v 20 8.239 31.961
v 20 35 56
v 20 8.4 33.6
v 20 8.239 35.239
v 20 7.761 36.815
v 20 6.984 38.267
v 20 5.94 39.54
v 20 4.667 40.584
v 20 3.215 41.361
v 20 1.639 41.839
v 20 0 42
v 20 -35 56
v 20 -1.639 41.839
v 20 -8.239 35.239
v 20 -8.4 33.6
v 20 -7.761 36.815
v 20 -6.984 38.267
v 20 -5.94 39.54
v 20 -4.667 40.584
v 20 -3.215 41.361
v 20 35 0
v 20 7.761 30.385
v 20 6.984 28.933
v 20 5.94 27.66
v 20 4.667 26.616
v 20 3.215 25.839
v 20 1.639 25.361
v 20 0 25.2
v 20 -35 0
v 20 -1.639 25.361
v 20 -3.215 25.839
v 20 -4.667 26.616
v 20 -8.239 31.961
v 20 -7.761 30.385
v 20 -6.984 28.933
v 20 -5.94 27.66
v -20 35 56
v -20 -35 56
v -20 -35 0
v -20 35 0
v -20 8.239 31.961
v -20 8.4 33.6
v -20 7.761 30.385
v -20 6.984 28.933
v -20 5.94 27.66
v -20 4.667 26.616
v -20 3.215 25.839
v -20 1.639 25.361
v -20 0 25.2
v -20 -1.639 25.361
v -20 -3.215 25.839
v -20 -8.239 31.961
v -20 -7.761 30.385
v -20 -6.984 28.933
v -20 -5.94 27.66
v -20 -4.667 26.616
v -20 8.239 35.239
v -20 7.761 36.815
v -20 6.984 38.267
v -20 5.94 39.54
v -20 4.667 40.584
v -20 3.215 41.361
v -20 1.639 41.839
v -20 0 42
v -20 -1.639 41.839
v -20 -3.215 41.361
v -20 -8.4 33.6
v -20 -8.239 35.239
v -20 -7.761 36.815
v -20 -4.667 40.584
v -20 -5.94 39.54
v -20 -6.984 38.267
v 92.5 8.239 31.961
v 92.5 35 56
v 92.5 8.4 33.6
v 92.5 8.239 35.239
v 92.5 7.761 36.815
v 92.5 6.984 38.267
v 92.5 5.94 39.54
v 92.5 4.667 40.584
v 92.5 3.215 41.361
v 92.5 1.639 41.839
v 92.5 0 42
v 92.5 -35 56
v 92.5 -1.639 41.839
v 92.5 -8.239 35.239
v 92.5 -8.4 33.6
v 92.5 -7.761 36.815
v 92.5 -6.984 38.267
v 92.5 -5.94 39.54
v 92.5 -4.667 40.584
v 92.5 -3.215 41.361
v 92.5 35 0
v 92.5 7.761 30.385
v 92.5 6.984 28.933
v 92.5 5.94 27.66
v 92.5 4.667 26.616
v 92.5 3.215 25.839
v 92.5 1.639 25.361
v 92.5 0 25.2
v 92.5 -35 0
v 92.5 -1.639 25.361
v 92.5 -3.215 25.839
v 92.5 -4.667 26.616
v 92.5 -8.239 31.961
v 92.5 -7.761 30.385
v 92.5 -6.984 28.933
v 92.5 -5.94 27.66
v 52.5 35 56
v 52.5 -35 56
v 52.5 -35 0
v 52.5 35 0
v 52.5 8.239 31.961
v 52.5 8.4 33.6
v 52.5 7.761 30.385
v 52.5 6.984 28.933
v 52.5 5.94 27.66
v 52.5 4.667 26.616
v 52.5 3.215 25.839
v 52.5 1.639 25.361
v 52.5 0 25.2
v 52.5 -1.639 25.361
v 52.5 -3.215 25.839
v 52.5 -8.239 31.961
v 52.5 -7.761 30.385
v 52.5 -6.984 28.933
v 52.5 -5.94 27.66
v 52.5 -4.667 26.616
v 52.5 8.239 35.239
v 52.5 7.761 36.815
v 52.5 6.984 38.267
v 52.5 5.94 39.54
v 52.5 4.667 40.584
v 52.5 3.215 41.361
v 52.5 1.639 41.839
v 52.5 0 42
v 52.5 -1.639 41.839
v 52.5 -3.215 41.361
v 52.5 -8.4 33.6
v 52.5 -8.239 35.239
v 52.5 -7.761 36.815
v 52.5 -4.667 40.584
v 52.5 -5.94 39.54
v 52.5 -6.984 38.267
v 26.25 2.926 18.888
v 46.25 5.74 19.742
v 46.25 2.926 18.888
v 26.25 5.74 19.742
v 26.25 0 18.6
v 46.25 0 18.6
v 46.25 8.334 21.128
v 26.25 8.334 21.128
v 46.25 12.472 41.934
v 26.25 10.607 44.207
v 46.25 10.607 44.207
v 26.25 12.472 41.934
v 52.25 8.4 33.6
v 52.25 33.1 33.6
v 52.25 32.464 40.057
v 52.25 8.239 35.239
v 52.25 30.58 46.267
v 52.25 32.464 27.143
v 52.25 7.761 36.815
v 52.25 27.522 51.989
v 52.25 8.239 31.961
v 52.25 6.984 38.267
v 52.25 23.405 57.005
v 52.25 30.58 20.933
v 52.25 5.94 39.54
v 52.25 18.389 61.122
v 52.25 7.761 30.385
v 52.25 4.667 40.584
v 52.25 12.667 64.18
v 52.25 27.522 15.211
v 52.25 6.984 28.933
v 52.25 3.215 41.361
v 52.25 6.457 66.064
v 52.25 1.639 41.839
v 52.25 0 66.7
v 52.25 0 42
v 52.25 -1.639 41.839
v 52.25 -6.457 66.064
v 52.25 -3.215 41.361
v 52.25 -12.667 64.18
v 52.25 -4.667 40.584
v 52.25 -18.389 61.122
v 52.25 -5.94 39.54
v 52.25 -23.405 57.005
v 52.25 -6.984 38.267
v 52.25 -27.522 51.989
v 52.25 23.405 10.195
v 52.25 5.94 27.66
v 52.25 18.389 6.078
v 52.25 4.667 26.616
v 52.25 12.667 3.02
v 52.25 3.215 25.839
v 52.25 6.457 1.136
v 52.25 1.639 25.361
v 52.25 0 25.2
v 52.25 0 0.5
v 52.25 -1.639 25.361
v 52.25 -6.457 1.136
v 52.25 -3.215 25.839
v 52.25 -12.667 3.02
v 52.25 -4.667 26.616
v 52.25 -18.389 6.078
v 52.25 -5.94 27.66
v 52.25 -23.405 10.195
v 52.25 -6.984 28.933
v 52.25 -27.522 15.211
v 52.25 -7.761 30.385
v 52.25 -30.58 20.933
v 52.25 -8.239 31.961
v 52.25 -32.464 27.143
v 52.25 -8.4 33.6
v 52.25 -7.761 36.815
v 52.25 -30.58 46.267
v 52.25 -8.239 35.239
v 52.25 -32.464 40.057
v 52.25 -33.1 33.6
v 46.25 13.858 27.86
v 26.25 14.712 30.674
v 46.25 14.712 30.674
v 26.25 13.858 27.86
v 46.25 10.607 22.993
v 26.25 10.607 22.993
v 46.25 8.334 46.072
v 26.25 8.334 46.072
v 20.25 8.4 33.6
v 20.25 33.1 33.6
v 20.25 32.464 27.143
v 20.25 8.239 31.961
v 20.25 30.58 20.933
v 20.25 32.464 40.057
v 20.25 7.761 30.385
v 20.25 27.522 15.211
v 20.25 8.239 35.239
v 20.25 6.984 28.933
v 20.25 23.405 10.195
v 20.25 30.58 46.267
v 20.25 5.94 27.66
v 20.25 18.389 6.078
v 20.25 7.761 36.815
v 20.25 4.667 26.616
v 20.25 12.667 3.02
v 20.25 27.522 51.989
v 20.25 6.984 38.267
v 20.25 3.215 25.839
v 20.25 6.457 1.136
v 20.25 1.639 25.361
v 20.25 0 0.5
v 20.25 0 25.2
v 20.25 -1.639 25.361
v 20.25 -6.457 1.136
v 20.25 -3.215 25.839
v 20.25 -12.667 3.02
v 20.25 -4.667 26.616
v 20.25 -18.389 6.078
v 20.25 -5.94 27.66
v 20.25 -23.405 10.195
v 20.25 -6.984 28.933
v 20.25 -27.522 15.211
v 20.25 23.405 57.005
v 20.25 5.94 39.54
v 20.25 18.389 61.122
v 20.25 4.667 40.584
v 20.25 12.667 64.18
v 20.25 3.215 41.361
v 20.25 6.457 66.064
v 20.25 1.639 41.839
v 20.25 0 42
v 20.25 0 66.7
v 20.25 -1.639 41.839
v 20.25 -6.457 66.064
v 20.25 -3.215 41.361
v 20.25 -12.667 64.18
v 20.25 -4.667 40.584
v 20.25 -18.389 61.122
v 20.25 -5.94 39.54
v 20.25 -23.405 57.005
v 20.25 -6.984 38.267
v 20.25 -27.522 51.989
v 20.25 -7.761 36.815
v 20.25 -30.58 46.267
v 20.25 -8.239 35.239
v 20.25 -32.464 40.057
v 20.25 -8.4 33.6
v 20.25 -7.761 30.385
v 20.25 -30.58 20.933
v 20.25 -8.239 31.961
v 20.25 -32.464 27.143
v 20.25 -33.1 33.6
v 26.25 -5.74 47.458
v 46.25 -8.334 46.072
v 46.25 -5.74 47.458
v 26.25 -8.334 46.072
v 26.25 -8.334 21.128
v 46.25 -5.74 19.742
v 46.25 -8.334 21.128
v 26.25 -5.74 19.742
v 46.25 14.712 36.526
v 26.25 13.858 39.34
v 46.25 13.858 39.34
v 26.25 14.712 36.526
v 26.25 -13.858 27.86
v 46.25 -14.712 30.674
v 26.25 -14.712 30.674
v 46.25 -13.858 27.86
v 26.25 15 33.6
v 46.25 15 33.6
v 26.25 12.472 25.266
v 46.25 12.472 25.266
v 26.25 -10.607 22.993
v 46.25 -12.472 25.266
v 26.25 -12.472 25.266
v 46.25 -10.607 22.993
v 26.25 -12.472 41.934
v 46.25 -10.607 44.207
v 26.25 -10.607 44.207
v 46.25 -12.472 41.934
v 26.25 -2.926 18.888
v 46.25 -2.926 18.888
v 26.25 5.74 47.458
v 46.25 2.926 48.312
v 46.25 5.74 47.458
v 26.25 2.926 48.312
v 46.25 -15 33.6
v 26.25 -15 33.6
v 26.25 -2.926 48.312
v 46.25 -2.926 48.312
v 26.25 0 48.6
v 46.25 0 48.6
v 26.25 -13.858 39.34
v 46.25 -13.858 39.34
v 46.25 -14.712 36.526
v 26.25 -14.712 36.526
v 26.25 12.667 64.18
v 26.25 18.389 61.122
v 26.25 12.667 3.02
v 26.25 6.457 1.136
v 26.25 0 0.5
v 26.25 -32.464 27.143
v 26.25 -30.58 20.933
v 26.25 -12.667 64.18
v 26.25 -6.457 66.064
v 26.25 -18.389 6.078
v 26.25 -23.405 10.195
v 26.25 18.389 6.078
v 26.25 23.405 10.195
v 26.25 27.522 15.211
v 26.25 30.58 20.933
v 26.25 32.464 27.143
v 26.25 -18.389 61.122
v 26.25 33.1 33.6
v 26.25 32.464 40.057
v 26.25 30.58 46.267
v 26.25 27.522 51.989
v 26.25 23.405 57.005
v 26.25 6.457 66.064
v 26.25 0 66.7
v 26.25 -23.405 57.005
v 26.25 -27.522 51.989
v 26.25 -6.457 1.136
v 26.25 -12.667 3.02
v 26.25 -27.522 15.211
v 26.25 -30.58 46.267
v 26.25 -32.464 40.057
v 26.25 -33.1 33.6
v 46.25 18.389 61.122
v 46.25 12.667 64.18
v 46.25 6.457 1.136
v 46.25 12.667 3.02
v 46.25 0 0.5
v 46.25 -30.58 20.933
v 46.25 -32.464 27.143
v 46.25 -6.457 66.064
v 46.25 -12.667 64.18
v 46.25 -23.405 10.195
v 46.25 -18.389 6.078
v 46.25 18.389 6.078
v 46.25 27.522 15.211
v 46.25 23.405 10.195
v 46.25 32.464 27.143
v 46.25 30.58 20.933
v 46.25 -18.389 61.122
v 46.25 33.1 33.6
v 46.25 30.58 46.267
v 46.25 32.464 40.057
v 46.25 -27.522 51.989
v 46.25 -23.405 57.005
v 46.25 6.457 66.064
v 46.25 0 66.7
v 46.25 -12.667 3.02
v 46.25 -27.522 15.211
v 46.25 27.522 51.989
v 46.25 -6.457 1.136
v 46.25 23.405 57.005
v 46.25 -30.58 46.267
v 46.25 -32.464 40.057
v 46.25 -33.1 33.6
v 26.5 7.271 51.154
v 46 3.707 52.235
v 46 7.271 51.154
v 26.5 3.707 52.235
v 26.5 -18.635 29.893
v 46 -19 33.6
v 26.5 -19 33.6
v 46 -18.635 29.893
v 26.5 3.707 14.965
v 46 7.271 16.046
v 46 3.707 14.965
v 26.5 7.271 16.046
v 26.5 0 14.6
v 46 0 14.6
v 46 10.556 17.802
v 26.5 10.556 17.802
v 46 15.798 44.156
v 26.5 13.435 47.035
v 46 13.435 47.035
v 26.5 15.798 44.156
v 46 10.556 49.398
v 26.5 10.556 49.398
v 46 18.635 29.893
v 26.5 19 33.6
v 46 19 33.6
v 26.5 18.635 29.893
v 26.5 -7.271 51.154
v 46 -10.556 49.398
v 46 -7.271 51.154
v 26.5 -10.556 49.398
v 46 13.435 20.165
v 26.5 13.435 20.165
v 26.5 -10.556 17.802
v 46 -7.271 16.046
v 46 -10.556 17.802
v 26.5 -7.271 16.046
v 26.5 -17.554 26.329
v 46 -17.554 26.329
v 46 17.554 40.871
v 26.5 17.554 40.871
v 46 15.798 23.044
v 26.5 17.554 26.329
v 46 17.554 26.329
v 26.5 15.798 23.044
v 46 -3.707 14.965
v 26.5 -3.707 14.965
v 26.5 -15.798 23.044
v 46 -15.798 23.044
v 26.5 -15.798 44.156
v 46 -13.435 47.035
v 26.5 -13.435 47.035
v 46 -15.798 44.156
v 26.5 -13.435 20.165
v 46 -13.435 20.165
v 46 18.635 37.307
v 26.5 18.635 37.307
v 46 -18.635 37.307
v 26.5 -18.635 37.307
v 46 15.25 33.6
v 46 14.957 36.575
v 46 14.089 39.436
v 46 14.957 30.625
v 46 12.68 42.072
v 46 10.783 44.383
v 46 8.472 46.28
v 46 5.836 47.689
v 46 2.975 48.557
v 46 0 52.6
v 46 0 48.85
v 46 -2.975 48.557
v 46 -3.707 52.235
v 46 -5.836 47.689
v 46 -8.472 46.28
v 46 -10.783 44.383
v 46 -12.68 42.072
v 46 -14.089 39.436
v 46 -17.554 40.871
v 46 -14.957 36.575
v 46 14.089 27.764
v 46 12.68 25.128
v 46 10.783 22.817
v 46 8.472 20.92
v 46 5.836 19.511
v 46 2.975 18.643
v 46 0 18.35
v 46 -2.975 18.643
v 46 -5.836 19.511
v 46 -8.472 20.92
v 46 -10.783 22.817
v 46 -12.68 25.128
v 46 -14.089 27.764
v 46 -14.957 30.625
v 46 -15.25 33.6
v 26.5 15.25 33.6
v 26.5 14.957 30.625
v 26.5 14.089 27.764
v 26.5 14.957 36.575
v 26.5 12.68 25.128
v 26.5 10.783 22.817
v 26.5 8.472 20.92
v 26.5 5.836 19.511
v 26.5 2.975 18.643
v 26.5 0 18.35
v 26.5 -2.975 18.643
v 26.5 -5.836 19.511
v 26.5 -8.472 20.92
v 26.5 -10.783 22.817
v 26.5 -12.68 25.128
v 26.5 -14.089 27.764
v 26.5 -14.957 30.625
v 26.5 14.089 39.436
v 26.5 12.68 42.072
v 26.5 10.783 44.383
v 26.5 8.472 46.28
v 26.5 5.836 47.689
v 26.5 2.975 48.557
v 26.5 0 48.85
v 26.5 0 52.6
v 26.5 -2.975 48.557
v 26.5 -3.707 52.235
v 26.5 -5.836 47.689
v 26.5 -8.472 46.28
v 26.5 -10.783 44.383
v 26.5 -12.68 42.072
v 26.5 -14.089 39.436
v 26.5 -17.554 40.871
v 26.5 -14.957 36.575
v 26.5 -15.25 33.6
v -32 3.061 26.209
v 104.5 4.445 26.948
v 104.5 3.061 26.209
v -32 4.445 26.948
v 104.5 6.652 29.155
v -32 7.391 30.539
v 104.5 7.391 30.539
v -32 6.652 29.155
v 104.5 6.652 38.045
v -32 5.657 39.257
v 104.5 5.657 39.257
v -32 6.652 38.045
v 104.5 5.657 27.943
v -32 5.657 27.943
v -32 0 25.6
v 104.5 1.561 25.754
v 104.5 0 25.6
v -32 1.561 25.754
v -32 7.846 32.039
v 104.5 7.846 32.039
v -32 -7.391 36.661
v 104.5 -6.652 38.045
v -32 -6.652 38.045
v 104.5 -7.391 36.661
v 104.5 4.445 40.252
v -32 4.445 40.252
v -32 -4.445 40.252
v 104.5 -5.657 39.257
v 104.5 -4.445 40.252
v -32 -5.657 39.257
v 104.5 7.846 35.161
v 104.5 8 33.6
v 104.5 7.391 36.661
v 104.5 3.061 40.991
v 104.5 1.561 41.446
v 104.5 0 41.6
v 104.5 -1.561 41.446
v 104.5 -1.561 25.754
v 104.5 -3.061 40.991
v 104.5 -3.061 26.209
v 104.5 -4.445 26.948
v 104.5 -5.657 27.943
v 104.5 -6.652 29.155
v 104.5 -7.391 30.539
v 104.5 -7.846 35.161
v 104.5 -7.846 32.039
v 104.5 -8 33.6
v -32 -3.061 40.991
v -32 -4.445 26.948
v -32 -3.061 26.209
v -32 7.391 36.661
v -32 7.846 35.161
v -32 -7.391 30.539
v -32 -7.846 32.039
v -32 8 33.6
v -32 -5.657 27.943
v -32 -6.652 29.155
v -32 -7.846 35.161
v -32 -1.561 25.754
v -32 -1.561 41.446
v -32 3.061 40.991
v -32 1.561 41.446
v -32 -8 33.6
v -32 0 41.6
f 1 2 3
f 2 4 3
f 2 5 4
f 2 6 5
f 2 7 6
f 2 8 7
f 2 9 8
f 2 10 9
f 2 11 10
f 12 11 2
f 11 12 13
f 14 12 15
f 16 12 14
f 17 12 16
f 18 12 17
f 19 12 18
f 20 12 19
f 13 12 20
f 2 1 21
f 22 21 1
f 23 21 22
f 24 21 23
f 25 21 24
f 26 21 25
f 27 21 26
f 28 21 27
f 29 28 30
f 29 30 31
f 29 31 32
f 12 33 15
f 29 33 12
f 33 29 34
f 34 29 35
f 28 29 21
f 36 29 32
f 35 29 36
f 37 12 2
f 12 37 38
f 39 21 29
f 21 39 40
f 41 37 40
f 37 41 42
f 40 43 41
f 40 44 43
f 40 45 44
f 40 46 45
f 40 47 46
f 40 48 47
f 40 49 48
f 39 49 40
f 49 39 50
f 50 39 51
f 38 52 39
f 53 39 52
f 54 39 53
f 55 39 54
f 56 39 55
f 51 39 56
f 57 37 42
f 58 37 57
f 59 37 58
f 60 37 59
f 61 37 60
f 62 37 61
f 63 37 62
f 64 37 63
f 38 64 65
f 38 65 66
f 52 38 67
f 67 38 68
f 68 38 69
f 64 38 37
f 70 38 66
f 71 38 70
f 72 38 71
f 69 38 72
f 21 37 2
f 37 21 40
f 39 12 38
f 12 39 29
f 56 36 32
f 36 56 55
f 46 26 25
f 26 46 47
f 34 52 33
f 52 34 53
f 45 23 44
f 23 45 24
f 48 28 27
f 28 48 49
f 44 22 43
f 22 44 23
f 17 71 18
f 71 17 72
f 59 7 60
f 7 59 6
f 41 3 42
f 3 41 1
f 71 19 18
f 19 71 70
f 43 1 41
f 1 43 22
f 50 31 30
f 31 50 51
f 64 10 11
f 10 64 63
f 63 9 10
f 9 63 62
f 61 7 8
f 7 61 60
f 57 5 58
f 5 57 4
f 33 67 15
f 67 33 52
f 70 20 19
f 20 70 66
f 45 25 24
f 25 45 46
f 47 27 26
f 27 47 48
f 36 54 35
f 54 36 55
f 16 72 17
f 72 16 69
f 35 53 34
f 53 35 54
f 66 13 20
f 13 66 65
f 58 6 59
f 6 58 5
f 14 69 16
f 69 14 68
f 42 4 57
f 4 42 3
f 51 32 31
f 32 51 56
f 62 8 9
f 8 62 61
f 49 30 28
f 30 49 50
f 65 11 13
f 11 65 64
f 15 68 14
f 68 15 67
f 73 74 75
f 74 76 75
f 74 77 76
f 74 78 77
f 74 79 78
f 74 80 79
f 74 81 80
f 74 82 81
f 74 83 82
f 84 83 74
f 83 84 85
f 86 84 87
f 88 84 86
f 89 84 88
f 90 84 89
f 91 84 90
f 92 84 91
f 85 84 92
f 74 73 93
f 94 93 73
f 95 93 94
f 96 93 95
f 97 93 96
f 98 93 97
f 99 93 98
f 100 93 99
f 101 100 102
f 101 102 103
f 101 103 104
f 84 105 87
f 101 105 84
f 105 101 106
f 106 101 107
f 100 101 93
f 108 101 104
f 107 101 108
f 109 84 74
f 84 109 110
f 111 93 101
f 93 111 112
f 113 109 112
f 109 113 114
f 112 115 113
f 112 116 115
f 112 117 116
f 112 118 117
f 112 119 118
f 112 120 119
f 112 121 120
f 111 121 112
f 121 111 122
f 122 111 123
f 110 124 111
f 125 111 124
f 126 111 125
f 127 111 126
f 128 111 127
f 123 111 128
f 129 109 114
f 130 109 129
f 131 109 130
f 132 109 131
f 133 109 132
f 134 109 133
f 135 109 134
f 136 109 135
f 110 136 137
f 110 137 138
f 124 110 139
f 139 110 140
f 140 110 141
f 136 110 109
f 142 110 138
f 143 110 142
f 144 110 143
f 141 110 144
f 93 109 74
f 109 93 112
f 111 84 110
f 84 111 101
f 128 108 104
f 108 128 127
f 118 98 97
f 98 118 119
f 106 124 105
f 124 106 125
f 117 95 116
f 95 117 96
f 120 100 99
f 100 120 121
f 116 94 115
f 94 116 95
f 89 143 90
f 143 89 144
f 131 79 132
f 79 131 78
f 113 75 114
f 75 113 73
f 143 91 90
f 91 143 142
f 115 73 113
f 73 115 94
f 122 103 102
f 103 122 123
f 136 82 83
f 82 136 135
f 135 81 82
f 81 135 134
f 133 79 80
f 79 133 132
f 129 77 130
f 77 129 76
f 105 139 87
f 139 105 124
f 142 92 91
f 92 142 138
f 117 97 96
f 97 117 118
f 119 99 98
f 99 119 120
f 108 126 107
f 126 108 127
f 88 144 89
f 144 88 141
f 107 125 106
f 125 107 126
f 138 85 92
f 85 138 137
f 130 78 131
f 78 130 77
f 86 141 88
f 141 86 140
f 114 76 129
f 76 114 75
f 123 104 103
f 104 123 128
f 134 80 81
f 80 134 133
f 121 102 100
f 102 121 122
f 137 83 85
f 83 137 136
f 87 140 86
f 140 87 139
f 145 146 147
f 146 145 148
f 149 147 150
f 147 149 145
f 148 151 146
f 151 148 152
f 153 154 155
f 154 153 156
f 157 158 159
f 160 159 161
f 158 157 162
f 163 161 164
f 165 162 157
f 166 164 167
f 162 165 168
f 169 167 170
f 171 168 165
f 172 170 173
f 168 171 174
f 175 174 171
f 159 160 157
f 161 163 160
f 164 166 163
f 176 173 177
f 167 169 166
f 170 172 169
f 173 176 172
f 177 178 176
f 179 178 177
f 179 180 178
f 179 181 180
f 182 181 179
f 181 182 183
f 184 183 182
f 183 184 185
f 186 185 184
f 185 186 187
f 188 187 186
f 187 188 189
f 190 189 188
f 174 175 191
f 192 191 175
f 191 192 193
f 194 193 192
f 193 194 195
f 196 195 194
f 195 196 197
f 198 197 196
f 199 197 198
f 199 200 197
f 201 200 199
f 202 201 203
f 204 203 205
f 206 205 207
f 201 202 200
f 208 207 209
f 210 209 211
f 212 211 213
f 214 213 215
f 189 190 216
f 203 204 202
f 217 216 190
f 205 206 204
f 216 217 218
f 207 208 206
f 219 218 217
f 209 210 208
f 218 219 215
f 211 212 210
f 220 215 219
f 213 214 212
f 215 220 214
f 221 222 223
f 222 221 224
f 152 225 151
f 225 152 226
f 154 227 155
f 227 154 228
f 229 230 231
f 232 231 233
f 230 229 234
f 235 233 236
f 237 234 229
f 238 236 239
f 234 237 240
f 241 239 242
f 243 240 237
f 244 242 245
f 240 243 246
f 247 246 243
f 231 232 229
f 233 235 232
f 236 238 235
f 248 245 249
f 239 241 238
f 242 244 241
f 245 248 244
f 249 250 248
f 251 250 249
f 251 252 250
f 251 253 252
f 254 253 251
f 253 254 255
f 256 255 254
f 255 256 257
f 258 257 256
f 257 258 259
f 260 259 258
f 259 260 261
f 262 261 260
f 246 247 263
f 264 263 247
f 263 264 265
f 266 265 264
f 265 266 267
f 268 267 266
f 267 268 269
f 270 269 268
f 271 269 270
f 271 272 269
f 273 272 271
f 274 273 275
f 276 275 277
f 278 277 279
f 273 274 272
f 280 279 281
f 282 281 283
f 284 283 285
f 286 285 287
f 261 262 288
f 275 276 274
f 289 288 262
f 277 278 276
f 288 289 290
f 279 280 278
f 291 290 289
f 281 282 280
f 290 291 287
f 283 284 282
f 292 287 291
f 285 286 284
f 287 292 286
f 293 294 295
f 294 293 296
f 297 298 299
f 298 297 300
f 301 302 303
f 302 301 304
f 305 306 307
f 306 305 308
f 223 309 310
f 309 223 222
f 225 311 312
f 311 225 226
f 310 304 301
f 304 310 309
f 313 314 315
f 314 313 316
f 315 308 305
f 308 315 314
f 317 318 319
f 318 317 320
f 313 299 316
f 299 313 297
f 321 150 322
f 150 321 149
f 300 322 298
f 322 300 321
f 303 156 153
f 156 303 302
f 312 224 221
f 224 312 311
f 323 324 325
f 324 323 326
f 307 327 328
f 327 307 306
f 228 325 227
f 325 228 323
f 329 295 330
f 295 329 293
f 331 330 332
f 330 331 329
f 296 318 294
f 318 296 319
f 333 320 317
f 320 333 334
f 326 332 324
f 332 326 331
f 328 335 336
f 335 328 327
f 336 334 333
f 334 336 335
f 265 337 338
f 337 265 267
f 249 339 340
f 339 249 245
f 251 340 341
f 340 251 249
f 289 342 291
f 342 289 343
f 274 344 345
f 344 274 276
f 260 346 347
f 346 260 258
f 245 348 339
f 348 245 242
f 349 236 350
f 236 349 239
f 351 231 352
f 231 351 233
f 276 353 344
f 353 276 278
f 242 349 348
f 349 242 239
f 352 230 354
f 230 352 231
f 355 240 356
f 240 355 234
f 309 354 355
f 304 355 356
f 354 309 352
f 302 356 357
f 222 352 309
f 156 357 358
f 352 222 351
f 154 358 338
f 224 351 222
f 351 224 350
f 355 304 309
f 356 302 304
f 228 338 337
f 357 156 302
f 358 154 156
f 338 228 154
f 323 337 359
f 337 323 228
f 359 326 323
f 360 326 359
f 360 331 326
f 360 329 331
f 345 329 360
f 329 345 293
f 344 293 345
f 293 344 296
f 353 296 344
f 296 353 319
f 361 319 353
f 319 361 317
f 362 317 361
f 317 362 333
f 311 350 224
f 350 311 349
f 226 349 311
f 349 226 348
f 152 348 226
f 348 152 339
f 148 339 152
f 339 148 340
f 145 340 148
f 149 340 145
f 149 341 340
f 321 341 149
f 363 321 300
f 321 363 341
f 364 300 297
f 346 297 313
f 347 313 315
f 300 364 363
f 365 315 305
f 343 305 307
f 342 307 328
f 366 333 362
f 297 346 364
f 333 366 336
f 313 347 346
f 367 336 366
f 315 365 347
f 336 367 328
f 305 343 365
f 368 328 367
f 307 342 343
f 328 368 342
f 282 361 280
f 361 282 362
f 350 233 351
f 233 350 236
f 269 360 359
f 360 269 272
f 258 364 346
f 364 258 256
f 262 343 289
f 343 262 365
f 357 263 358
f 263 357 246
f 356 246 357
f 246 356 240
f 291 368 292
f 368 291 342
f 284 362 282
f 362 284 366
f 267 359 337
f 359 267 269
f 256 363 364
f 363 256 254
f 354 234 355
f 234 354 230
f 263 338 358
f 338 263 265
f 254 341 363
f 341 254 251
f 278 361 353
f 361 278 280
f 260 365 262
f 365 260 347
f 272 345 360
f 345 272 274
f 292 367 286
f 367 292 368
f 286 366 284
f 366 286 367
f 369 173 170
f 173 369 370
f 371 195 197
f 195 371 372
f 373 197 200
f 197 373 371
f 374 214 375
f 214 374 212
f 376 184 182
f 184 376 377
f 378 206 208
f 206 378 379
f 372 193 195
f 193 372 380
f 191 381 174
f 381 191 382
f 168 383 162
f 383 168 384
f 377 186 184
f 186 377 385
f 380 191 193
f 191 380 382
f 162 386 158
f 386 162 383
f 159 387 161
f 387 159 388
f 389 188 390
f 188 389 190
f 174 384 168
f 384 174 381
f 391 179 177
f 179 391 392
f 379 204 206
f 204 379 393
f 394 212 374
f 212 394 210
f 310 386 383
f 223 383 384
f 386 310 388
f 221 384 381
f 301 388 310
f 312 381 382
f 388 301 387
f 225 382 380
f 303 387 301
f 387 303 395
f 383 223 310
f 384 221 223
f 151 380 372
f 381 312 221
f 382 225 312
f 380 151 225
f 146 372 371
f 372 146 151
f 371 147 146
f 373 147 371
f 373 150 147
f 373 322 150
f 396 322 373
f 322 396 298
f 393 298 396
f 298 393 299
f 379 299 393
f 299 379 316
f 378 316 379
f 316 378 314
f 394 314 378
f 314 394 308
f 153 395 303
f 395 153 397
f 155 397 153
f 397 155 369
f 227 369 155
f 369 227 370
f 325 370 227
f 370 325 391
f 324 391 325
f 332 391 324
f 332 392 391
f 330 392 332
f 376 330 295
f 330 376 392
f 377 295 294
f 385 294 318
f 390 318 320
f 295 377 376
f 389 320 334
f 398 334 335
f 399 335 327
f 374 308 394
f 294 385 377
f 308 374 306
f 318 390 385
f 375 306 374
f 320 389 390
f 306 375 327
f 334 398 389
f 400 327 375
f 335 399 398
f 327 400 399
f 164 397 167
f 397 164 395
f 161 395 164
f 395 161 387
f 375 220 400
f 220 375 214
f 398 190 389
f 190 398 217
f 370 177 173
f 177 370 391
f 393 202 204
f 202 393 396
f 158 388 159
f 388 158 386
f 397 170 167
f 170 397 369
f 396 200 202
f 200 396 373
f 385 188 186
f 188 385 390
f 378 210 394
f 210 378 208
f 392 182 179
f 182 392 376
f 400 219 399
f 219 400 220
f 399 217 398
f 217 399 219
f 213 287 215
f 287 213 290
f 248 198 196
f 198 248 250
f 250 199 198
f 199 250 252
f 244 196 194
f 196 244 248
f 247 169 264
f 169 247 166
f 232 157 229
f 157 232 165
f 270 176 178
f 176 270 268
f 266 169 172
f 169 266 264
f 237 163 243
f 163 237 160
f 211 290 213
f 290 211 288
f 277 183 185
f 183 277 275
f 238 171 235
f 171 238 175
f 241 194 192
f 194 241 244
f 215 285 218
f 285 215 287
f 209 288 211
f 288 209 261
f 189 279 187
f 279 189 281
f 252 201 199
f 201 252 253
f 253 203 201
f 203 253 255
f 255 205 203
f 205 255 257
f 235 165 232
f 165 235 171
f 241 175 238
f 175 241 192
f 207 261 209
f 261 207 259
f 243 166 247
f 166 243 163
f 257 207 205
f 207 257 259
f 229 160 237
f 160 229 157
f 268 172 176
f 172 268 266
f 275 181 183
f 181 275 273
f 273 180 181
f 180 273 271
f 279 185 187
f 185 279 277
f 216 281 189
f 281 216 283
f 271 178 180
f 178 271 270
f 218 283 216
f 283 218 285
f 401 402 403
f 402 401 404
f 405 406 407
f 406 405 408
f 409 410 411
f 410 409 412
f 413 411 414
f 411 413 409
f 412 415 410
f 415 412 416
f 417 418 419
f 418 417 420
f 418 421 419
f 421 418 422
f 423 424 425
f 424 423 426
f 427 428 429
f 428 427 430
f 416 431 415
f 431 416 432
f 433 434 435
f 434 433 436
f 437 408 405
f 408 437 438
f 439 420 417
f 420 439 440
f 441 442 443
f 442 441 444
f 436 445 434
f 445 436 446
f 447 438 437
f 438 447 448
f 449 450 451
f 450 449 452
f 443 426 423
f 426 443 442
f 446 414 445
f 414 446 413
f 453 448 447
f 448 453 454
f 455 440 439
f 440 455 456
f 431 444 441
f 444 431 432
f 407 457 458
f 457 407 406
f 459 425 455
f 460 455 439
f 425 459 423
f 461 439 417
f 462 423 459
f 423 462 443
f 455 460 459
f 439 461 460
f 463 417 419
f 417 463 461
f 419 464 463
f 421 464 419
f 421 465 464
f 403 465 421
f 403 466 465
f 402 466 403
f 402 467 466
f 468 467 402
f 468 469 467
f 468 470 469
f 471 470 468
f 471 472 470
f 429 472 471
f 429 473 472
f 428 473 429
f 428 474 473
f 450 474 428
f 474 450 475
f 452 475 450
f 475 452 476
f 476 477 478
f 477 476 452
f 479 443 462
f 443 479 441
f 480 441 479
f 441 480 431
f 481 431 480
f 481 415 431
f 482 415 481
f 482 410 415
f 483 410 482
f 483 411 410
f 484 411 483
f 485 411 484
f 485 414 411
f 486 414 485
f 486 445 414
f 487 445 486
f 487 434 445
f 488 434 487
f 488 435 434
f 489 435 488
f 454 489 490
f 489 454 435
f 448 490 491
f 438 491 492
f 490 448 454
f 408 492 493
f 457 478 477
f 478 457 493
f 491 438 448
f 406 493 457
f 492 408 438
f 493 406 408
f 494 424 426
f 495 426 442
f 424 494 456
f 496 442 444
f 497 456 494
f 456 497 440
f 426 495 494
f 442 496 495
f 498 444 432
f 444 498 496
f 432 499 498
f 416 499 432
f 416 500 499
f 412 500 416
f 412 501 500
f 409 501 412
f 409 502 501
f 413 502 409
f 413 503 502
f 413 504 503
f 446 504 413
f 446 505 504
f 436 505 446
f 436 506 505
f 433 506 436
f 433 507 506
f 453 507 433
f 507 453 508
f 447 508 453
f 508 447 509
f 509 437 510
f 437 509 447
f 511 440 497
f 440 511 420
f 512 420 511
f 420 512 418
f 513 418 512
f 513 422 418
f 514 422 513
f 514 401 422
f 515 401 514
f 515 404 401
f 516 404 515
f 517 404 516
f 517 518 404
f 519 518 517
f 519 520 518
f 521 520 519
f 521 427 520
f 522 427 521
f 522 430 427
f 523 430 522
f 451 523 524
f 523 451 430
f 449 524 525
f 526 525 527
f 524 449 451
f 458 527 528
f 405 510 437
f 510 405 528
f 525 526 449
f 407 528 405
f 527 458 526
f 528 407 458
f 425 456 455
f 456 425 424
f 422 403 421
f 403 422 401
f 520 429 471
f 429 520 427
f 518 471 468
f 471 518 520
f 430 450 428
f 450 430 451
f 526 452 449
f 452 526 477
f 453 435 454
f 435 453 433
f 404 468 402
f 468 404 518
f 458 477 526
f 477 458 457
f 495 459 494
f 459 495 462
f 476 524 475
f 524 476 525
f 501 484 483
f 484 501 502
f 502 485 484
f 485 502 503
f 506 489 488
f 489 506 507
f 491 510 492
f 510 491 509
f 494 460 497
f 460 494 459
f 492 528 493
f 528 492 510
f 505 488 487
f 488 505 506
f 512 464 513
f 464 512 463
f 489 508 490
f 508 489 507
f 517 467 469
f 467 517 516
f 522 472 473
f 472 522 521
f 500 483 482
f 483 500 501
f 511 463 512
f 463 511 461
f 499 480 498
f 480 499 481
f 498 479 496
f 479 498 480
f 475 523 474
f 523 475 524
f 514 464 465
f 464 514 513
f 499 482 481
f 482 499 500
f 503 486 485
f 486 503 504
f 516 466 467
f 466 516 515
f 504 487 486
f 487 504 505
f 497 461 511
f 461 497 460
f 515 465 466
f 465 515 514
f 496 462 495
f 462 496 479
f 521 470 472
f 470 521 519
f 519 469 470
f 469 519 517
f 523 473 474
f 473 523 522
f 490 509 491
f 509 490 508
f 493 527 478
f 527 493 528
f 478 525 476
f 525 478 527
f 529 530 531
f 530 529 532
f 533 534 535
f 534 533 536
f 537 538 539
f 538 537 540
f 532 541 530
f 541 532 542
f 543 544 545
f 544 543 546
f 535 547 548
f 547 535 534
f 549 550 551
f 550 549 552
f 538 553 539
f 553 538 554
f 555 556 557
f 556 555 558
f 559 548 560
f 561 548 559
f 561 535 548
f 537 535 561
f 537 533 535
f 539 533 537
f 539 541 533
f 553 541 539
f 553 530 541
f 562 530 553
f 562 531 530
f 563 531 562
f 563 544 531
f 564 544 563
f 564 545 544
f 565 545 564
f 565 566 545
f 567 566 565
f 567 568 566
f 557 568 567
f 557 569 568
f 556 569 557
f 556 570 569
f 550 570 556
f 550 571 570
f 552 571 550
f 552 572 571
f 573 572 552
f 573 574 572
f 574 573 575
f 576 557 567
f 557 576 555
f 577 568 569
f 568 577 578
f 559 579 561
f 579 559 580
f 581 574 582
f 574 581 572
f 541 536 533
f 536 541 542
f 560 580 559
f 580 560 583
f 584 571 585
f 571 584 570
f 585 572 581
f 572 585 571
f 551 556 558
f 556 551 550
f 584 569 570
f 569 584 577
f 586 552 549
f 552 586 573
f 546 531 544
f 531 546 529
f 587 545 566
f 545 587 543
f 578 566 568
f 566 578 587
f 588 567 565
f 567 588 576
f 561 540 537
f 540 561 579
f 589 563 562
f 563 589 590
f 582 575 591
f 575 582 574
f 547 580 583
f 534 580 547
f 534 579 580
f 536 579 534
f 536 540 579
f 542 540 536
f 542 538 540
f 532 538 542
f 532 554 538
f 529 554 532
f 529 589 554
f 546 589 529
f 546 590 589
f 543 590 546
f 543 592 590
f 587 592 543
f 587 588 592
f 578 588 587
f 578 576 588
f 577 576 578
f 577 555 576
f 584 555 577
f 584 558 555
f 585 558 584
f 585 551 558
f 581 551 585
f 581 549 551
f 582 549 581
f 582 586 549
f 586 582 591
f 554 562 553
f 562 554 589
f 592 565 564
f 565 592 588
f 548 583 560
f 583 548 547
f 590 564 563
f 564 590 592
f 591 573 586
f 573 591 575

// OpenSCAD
$fn = 32;

// ------------------------------------------------------------------------
// Pulley assembly: d66.2 pulley with a belt, shaft d16
// Every part is its own module, assembly() places them once.
// ------------------------------------------------------------------------

// --- part 1 ---
module support1() {
  difference() {
    translate([-20, -35, 0]) cube([40, 70, 56]);
    translate([0, 0, 33.6]) rotate([0, 90, 0]) cylinder(h = 42, d = 16.8, center = true);
  }
}

// --- part 2 ---
module support2() {
  difference() {
    translate([-20, -35, 0]) cube([40, 70, 56]);
    translate([0, 0, 33.6]) rotate([0, 90, 0]) cylinder(h = 42, d = 16.8, center = true);
  }
}

// --- part 3 ---
module shaft() {
  translate([0, 0, -68.25]) cylinder(h = 136.5, d = 16);
}

// --- part 4 ---
module pulley() {
  difference() {
    union() {
      cylinder(h = 32, d = 30);
      cylinder(h = 6, d = 66.2);
      translate([0, 0, 26]) cylinder(h = 6, d = 66.2);
    }
    translate([0, 0, -1]) cylinder(h = 34, d = 16.8);
  }
}

// --- part 5 ---
module belt() {
  difference() {
      translate([0, 0, 0]) cylinder(h = 19.5, d = 38);
      translate([0, 0, -1]) cylinder(h = 21.5, d = 30.5);
    }
}

// --- assembly ---
module assembly() {
  translate([0, 0, 0]) rotate([0, 0, 0]) support1();
  translate([72.5, 0, 0]) rotate([0, 0, 0]) support2();
  translate([36.25, 0, 33.6]) rotate([0, 90, 0]) shaft();
  translate([20.25, 0, 33.6]) rotate([0, 90, 0]) pulley();
  translate([26.5, 0, 33.6]) rotate([0, 90, 0]) belt();
}

assembly();
